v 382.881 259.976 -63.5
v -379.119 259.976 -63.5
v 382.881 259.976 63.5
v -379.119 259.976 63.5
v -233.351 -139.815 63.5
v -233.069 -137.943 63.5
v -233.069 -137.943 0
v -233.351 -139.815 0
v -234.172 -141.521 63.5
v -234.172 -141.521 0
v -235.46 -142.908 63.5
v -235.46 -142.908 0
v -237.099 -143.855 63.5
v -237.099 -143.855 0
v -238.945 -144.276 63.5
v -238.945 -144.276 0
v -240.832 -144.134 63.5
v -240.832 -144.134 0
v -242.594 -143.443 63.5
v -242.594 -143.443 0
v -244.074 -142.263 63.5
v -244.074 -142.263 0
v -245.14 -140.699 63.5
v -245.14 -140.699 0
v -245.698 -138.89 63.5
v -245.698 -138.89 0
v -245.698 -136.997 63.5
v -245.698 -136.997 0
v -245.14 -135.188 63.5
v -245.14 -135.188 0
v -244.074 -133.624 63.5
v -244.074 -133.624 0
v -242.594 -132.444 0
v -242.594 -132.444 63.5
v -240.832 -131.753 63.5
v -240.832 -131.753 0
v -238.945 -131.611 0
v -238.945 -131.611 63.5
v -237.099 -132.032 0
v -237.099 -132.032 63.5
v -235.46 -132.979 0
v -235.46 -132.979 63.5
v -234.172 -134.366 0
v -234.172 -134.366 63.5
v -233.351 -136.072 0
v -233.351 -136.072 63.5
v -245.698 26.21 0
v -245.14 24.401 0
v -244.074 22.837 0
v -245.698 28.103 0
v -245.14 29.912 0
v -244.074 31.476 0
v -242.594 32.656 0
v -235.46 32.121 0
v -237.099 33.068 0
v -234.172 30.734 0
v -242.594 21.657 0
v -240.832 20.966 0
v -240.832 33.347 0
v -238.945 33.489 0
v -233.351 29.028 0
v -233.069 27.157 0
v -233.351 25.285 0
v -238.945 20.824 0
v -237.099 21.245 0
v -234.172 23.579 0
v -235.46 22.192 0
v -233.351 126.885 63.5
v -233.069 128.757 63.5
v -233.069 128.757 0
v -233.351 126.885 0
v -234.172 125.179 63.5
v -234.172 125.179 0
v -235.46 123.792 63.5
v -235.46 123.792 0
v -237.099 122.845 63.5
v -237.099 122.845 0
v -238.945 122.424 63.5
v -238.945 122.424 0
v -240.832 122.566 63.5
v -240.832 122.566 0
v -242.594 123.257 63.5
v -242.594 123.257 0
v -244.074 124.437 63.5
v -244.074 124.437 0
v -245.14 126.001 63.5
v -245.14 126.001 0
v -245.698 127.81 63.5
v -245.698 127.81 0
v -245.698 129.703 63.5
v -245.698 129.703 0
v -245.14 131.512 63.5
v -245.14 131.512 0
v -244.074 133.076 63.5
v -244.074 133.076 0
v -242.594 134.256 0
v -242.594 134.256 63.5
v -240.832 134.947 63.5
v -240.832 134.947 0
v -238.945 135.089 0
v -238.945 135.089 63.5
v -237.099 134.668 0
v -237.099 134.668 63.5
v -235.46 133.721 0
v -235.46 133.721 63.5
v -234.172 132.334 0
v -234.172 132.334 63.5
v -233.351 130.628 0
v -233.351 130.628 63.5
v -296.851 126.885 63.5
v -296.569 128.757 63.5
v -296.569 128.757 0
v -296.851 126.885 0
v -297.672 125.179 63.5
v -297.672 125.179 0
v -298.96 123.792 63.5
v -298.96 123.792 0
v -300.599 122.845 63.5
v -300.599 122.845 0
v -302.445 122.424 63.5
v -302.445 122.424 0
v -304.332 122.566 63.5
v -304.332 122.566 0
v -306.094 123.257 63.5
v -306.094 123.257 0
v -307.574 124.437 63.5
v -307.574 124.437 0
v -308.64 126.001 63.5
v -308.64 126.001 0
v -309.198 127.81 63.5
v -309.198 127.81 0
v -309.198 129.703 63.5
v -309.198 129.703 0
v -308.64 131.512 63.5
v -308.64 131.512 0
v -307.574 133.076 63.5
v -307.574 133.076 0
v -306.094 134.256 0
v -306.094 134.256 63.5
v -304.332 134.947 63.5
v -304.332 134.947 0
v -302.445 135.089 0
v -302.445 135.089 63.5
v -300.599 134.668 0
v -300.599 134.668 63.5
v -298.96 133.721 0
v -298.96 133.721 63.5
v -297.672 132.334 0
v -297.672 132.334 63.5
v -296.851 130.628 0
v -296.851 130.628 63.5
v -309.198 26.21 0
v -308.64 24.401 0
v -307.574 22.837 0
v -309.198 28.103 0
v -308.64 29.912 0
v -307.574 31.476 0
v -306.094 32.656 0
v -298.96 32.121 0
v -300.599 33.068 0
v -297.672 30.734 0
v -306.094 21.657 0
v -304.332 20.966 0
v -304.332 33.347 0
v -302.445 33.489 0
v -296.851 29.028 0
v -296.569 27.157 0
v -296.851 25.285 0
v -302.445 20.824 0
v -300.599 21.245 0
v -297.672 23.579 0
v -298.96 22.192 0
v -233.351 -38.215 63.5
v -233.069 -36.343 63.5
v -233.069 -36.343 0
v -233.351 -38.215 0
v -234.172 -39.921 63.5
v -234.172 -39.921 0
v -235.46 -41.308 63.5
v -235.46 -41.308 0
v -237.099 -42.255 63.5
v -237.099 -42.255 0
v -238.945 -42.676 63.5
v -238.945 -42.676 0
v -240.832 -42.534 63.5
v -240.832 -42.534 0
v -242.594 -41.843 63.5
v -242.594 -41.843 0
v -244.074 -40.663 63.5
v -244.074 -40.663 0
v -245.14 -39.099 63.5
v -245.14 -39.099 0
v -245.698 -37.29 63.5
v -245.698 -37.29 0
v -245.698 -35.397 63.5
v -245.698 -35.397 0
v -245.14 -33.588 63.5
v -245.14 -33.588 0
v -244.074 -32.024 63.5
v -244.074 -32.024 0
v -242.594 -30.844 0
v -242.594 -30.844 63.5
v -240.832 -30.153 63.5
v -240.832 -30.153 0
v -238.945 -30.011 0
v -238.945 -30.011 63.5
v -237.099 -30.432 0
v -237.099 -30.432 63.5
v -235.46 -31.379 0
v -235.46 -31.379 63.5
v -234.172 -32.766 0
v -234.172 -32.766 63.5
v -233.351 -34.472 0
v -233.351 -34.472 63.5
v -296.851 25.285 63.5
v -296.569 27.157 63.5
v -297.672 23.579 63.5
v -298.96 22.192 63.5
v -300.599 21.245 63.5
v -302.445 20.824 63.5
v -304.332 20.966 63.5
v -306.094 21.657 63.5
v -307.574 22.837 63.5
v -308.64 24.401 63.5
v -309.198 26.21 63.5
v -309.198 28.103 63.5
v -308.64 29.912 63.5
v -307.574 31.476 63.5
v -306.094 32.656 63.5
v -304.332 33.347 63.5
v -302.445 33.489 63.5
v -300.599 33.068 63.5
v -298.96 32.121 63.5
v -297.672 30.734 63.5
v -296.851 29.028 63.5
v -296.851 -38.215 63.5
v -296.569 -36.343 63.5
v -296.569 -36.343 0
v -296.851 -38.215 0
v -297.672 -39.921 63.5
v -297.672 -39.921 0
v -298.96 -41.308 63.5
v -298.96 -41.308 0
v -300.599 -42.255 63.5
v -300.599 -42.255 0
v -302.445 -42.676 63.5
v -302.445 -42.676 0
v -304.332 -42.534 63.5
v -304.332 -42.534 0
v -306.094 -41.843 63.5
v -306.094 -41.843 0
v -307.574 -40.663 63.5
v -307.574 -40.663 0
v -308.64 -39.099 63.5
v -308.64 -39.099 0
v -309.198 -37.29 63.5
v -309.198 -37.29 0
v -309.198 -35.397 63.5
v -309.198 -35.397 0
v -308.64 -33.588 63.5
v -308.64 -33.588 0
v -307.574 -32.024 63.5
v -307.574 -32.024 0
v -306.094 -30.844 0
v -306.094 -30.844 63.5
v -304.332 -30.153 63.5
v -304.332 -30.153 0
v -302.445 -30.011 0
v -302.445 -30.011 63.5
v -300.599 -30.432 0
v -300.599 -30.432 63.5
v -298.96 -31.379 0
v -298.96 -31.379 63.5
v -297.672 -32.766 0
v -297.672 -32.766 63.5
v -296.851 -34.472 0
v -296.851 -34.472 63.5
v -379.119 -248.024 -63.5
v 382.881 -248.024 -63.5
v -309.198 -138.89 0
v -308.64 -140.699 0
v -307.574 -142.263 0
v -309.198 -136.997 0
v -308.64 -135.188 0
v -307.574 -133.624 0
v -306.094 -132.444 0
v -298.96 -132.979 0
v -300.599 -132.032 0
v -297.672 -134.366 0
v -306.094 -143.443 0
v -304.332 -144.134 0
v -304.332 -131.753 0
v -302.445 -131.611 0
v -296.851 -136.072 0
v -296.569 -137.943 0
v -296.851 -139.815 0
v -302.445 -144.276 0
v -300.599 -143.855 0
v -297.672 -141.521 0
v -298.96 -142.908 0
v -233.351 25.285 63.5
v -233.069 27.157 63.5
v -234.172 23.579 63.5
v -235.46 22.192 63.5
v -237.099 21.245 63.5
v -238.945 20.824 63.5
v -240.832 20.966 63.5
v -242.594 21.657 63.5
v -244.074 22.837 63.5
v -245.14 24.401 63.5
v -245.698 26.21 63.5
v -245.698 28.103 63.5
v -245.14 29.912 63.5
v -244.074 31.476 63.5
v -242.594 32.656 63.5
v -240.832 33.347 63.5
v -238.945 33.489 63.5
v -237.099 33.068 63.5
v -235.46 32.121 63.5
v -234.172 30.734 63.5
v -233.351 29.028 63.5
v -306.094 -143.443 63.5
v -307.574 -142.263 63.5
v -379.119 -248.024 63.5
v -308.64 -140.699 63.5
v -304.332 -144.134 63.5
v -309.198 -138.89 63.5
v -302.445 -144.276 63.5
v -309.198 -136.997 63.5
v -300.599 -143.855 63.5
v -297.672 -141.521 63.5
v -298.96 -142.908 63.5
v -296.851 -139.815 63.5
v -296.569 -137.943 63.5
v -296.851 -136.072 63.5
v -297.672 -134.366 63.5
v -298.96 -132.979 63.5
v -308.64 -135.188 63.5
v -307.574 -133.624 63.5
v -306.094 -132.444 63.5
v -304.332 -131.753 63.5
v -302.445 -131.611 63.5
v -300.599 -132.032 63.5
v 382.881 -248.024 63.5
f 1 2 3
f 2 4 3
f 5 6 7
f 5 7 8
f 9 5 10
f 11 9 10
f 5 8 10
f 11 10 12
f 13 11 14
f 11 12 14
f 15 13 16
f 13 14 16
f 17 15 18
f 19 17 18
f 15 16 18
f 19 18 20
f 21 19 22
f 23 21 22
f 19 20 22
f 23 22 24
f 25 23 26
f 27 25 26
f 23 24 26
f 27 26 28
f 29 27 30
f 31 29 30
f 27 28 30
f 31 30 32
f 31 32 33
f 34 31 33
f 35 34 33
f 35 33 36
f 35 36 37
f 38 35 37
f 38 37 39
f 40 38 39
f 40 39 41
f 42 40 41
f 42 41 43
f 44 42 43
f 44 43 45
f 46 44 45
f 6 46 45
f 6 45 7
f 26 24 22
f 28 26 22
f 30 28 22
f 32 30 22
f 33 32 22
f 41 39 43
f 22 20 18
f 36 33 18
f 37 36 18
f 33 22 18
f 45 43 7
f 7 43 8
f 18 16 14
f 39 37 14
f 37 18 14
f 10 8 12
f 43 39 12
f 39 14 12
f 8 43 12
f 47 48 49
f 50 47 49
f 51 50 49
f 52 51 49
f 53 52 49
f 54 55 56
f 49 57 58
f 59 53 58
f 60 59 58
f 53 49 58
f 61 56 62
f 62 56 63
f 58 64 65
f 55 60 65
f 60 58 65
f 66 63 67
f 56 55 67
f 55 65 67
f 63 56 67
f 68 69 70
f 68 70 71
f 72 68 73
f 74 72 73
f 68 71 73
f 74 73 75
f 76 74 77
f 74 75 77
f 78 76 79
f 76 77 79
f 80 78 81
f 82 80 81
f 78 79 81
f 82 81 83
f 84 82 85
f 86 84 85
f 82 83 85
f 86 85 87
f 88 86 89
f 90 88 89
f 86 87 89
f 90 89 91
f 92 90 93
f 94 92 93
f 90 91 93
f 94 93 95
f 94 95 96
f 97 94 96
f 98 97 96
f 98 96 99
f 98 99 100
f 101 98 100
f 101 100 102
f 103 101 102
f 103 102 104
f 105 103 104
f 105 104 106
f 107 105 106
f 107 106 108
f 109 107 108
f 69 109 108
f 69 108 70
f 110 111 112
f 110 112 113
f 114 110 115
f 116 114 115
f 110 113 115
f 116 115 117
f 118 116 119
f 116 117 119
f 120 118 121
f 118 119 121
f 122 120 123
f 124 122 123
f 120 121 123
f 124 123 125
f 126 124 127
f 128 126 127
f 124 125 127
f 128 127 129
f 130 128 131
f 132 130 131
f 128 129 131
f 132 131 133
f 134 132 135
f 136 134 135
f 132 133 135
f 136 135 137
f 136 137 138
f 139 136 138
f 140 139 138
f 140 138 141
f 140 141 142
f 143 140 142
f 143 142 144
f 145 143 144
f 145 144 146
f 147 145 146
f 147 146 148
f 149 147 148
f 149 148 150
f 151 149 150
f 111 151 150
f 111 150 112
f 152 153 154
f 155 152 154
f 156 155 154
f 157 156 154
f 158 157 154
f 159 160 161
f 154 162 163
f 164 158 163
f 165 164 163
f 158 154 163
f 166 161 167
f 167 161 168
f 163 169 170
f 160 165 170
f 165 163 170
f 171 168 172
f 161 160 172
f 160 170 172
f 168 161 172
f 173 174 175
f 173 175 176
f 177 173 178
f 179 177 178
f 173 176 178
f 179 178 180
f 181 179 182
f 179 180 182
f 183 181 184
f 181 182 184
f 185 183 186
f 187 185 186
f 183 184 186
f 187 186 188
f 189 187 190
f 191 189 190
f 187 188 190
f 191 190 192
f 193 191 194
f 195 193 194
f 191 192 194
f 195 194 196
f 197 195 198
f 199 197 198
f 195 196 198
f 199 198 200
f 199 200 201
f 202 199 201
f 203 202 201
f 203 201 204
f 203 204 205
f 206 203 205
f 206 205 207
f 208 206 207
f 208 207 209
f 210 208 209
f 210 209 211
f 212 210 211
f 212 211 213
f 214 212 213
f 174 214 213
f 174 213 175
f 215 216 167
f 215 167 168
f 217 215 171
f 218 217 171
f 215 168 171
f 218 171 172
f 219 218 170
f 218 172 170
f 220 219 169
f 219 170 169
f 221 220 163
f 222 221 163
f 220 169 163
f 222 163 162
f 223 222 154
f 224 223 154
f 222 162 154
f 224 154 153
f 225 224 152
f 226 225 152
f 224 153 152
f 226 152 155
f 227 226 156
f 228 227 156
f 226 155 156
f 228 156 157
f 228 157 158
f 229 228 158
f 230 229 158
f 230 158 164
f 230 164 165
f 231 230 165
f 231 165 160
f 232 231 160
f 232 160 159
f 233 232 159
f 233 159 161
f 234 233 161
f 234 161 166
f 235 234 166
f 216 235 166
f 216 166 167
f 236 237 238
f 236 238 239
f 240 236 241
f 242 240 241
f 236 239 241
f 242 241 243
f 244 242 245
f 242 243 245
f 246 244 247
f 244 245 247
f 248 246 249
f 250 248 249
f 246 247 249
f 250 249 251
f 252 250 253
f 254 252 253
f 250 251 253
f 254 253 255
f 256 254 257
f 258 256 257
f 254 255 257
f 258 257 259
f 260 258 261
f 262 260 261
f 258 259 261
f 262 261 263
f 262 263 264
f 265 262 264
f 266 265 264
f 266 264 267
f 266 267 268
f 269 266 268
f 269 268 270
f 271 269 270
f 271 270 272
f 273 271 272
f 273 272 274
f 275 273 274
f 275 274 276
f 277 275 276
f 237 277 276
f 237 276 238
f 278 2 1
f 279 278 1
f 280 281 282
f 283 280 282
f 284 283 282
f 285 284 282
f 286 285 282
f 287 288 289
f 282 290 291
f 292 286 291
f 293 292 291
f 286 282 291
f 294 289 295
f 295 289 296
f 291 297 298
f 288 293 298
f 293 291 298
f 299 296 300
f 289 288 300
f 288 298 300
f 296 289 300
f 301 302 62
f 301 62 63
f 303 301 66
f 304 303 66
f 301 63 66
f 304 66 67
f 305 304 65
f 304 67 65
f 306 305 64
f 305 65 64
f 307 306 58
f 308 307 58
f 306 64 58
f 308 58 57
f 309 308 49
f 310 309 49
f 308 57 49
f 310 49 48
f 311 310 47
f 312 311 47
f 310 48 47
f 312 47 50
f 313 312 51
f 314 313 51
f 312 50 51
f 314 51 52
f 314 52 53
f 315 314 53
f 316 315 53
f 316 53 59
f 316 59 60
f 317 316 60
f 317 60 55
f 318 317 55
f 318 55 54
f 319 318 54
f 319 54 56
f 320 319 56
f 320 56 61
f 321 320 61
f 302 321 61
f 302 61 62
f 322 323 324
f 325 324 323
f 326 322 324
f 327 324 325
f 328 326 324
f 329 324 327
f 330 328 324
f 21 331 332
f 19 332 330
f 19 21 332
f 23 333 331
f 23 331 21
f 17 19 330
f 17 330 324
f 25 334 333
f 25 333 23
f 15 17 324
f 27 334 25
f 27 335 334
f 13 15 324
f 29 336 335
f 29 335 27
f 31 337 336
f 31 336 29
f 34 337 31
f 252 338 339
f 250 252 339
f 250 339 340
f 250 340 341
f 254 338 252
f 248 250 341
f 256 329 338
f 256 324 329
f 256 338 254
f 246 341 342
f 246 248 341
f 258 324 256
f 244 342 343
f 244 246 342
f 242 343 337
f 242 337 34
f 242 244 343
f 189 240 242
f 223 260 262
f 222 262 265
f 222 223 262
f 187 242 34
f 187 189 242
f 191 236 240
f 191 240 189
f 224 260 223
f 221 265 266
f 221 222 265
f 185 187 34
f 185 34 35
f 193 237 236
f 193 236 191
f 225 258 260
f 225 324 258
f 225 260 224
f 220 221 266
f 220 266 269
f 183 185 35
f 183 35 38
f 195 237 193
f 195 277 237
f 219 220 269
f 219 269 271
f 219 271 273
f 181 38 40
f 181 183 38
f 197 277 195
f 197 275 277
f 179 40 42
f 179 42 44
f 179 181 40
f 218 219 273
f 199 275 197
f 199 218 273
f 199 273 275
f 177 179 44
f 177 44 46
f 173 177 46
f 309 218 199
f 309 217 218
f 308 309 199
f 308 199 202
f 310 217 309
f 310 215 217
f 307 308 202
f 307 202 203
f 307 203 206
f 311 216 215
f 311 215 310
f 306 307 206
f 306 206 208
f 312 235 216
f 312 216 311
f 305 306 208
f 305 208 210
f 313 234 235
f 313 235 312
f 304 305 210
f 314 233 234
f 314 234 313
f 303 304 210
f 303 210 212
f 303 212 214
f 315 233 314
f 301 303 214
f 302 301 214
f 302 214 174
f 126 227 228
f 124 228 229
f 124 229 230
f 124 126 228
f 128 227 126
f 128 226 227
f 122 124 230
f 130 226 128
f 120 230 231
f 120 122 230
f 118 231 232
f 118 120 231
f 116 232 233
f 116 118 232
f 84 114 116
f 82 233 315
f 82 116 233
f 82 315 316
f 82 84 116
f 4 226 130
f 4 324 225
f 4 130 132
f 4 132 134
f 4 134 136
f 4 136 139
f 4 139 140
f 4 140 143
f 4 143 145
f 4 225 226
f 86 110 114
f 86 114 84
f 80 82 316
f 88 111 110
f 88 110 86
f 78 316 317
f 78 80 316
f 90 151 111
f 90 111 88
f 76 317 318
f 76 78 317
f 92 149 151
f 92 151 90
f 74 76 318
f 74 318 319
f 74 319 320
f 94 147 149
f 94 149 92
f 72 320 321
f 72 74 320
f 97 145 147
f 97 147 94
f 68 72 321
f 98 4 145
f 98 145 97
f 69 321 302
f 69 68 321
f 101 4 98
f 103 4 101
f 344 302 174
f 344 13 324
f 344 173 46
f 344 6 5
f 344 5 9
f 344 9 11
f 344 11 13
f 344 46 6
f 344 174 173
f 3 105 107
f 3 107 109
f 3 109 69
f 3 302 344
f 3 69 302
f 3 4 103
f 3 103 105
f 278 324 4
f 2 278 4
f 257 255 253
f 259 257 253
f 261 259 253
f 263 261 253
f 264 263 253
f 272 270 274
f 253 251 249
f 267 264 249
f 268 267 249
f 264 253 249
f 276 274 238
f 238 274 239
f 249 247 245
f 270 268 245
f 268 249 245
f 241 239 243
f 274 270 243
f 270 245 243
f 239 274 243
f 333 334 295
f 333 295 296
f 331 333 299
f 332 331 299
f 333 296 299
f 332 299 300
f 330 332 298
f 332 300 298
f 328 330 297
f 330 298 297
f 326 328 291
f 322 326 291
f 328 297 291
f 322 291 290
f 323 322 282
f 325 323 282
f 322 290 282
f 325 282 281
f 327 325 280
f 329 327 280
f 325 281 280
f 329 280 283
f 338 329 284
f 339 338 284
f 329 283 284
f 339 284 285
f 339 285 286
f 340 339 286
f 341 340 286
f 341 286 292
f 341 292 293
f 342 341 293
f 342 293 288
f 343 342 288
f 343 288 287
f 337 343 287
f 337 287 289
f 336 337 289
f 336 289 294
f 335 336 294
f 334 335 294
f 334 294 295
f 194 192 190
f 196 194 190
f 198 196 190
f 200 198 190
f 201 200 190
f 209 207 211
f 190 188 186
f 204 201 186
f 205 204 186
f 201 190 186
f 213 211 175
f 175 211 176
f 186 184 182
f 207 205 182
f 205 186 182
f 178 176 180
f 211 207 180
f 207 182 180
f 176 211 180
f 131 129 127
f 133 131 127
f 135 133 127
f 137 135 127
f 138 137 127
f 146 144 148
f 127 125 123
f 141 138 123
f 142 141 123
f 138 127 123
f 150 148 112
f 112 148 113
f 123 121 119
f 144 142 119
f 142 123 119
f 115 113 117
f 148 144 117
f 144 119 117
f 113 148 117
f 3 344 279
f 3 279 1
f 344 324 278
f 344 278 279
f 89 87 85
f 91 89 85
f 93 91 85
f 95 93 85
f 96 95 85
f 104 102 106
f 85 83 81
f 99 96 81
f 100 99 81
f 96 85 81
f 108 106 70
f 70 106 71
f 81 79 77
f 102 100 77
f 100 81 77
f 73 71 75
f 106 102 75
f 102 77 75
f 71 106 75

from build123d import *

# Parameters (mm, degrees)
F0_W     = 762
F0_H     = 508
F1_DEPTH = 63.5
F2_D     = 12.7
F2_DEPTH = 63.501


with BuildPart() as f1:
    # F0 (on Top) → F1 (new body, symmetric)
    with BuildSketch(Plane.XY):
        with Locations((1.8808878958, 5.9762554561)):
            Rectangle(F0_W, F0_H)
    extrude(amount=F1_DEPTH, both=True)

    # F2 (through all, one way)
    with BuildSketch(Plane(origin=(0, 0, 0), x_dir=(1, 0, 0), z_dir=(0, 0, -1))):
        with Locations((-302.9191121042, -128.7565231323), (-239.4191121042, -128.7565231323), (-302.9191121042, -27.1565231323), (-239.4191121042, -27.1565231323), (-302.9191121042, 36.3434768677), (-239.4191121042, 36.3434768677), (-302.9191121042, 137.9434768677), (-239.4191121042, 137.9434768677)):
            Circle(F2_D / 2)
    extrude(amount=-F2_DEPTH, mode=Mode.SUBTRACT)


solid = f1.part
